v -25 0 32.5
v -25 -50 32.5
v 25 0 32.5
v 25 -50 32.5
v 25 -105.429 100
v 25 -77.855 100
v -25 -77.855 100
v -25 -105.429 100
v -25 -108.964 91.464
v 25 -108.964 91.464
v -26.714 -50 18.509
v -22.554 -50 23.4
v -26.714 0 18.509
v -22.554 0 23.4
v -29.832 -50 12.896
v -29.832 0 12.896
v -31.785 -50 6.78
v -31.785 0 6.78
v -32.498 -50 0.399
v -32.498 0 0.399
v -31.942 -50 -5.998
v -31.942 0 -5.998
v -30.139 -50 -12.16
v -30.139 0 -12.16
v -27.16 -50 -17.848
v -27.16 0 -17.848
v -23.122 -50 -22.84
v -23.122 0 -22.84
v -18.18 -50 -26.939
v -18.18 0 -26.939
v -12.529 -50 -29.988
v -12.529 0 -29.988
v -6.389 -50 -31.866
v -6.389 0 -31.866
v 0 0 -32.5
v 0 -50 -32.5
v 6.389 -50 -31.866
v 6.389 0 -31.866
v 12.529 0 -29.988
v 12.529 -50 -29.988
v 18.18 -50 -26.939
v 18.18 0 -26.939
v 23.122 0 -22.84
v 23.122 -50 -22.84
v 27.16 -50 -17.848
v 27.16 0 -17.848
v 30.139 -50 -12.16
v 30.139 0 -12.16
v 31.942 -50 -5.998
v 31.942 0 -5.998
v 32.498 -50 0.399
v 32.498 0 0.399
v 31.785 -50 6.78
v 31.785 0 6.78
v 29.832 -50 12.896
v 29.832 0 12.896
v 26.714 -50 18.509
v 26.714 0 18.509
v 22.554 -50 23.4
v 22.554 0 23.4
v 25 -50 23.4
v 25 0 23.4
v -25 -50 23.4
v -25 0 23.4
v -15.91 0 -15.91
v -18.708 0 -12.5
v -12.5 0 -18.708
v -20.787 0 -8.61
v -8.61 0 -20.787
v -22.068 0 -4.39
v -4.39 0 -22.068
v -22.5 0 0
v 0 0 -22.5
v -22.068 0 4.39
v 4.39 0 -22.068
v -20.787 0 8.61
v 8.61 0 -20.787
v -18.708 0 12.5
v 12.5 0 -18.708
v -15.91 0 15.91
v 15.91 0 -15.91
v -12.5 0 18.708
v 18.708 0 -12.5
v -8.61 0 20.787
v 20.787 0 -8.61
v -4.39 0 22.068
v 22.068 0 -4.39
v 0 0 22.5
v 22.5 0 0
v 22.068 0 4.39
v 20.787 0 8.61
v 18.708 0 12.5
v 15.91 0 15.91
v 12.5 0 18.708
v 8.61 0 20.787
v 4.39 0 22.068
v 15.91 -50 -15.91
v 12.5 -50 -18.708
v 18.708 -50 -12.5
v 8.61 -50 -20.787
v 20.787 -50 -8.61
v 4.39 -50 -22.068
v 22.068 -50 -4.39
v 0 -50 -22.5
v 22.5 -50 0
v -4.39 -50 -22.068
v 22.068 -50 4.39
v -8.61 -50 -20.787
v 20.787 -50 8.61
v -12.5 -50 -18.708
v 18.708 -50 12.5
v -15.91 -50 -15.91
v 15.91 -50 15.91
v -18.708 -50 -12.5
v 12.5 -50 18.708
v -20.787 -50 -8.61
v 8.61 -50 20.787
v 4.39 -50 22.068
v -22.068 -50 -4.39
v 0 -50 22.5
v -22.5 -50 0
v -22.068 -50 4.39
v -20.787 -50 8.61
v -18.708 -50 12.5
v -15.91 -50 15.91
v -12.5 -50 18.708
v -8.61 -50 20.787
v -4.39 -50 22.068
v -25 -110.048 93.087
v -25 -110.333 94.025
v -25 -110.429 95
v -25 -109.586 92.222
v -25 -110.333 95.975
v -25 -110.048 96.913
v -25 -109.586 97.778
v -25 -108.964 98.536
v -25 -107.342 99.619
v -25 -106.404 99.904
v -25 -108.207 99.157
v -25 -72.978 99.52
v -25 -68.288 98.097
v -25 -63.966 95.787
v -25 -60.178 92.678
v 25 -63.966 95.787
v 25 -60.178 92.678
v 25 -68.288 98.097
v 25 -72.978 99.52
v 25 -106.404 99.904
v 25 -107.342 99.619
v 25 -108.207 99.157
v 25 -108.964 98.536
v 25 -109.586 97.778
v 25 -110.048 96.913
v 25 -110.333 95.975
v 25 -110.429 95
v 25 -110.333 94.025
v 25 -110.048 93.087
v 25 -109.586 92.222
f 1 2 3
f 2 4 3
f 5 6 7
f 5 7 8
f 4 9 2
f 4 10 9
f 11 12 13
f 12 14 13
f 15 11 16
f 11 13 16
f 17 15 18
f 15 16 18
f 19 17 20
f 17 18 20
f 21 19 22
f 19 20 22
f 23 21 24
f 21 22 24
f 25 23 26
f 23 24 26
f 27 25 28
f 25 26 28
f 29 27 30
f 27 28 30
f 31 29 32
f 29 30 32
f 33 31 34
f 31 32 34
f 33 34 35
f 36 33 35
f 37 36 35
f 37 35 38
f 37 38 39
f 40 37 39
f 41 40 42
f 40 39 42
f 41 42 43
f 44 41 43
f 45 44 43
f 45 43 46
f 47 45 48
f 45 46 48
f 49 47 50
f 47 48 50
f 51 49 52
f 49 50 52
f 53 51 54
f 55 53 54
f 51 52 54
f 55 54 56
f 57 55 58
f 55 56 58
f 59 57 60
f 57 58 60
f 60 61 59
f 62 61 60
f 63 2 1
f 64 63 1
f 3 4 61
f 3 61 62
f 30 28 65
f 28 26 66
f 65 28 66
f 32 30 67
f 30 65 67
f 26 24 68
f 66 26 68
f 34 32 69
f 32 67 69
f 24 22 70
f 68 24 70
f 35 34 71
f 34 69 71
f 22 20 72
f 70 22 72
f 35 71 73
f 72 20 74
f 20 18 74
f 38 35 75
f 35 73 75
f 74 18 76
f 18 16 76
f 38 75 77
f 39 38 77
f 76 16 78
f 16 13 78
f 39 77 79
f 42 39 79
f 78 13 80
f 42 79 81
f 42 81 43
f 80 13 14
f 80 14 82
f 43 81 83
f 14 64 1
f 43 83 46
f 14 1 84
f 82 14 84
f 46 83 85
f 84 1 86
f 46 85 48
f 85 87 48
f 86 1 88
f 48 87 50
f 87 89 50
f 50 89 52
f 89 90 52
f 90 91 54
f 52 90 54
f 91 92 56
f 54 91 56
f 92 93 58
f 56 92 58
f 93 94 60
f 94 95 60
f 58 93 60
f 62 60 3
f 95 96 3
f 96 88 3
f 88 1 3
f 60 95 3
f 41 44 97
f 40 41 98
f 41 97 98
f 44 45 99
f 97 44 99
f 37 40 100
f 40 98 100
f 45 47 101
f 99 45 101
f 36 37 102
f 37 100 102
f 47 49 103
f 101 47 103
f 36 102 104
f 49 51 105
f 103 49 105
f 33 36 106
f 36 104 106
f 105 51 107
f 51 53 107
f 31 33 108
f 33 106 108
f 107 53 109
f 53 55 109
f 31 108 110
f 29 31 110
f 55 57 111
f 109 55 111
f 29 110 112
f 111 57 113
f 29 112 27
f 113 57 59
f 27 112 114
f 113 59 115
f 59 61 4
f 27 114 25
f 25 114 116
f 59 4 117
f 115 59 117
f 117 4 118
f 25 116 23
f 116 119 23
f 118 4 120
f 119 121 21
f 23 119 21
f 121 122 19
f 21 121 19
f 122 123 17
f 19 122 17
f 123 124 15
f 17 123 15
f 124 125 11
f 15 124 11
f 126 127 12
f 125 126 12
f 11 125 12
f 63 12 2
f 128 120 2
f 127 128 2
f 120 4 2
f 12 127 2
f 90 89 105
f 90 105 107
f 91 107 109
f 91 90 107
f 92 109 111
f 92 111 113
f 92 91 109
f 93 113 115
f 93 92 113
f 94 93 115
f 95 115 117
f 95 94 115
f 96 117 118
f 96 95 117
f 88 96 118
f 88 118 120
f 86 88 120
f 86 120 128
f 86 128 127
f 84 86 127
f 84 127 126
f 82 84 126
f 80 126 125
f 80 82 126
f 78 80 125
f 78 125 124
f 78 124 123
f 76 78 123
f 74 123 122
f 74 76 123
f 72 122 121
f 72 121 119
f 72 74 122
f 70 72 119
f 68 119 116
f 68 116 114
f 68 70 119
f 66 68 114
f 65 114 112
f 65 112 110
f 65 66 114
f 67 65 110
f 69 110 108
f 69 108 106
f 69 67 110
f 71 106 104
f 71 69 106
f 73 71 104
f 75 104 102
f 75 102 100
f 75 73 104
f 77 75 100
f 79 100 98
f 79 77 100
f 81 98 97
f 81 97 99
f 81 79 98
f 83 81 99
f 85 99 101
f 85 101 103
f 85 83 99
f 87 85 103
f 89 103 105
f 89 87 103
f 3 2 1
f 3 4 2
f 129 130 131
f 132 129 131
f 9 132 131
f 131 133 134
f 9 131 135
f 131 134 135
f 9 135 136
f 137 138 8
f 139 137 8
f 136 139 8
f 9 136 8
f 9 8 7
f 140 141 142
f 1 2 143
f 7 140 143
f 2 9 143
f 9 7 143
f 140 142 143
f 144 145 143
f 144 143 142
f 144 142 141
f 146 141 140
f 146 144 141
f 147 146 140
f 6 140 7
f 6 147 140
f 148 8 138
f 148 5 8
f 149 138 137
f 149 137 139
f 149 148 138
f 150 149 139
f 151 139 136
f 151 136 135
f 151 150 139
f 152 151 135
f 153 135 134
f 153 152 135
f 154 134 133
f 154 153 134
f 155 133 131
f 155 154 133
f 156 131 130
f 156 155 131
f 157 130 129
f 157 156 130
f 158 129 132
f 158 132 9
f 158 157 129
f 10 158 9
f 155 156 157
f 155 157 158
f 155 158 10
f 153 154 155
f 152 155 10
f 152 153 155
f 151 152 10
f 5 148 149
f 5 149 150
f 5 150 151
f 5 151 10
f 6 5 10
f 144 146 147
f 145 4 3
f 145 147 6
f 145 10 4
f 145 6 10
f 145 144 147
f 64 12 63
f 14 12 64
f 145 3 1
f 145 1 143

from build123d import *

# Parameters (mm, degrees)
F0_R          = 32.5
F0_R_2        = 22.5
F1_DEPTH      = 50
F3_DEPTH      = 25
F3_DEPTH_BACK = 25
F4_DEPTH      = 9.1


with BuildPart() as f1:
    # F0 (on Front) → F1 (new body)
    with BuildSketch(Plane.XZ):
        Circle(F0_R)
        Circle(F0_R_2, mode=Mode.SUBTRACT)
    extrude(amount=F1_DEPTH)



with BuildPart() as f3:
    # F2 (on Right) → F3 (new body, two sides)
    with BuildSketch(Plane.YZ) as f3_sk:
        with BuildLine():
            Line((-50, 32.5), (0, 32.5))
            Line((0, 32.5), (-60.1776695297, 92.6776695297))
            ThreePointArc((-60.1776695297, 92.6776695297), (-68.2882532502, 98.0969883128), (-77.8553390593, 100))
            Line((-77.8553390593, 100), (-105.4289321881, 100))
            ThreePointArc((-105.4289321881, 100), (-110.0483298507, 96.9134171618), (-108.9644660941, 91.4644660941))
            Line((-108.9644660941, 91.4644660941), (-50, 32.5))
        make_face()
    extrude(amount=F3_DEPTH)
    extrude(f3_sk.sketch, amount=-F3_DEPTH_BACK)


with BuildPart() as f1_1:
    add(f1.part)
    # F4 (add): a face of the model
    f4_faces = [f3.part.faces().sort_by_distance(p)[0] for p in [
        (0, -25, 32.5),
    ]]
    extrude(f4_faces, amount=F4_DEPTH)


solid = Compound([f3.part, f1_1.part])
